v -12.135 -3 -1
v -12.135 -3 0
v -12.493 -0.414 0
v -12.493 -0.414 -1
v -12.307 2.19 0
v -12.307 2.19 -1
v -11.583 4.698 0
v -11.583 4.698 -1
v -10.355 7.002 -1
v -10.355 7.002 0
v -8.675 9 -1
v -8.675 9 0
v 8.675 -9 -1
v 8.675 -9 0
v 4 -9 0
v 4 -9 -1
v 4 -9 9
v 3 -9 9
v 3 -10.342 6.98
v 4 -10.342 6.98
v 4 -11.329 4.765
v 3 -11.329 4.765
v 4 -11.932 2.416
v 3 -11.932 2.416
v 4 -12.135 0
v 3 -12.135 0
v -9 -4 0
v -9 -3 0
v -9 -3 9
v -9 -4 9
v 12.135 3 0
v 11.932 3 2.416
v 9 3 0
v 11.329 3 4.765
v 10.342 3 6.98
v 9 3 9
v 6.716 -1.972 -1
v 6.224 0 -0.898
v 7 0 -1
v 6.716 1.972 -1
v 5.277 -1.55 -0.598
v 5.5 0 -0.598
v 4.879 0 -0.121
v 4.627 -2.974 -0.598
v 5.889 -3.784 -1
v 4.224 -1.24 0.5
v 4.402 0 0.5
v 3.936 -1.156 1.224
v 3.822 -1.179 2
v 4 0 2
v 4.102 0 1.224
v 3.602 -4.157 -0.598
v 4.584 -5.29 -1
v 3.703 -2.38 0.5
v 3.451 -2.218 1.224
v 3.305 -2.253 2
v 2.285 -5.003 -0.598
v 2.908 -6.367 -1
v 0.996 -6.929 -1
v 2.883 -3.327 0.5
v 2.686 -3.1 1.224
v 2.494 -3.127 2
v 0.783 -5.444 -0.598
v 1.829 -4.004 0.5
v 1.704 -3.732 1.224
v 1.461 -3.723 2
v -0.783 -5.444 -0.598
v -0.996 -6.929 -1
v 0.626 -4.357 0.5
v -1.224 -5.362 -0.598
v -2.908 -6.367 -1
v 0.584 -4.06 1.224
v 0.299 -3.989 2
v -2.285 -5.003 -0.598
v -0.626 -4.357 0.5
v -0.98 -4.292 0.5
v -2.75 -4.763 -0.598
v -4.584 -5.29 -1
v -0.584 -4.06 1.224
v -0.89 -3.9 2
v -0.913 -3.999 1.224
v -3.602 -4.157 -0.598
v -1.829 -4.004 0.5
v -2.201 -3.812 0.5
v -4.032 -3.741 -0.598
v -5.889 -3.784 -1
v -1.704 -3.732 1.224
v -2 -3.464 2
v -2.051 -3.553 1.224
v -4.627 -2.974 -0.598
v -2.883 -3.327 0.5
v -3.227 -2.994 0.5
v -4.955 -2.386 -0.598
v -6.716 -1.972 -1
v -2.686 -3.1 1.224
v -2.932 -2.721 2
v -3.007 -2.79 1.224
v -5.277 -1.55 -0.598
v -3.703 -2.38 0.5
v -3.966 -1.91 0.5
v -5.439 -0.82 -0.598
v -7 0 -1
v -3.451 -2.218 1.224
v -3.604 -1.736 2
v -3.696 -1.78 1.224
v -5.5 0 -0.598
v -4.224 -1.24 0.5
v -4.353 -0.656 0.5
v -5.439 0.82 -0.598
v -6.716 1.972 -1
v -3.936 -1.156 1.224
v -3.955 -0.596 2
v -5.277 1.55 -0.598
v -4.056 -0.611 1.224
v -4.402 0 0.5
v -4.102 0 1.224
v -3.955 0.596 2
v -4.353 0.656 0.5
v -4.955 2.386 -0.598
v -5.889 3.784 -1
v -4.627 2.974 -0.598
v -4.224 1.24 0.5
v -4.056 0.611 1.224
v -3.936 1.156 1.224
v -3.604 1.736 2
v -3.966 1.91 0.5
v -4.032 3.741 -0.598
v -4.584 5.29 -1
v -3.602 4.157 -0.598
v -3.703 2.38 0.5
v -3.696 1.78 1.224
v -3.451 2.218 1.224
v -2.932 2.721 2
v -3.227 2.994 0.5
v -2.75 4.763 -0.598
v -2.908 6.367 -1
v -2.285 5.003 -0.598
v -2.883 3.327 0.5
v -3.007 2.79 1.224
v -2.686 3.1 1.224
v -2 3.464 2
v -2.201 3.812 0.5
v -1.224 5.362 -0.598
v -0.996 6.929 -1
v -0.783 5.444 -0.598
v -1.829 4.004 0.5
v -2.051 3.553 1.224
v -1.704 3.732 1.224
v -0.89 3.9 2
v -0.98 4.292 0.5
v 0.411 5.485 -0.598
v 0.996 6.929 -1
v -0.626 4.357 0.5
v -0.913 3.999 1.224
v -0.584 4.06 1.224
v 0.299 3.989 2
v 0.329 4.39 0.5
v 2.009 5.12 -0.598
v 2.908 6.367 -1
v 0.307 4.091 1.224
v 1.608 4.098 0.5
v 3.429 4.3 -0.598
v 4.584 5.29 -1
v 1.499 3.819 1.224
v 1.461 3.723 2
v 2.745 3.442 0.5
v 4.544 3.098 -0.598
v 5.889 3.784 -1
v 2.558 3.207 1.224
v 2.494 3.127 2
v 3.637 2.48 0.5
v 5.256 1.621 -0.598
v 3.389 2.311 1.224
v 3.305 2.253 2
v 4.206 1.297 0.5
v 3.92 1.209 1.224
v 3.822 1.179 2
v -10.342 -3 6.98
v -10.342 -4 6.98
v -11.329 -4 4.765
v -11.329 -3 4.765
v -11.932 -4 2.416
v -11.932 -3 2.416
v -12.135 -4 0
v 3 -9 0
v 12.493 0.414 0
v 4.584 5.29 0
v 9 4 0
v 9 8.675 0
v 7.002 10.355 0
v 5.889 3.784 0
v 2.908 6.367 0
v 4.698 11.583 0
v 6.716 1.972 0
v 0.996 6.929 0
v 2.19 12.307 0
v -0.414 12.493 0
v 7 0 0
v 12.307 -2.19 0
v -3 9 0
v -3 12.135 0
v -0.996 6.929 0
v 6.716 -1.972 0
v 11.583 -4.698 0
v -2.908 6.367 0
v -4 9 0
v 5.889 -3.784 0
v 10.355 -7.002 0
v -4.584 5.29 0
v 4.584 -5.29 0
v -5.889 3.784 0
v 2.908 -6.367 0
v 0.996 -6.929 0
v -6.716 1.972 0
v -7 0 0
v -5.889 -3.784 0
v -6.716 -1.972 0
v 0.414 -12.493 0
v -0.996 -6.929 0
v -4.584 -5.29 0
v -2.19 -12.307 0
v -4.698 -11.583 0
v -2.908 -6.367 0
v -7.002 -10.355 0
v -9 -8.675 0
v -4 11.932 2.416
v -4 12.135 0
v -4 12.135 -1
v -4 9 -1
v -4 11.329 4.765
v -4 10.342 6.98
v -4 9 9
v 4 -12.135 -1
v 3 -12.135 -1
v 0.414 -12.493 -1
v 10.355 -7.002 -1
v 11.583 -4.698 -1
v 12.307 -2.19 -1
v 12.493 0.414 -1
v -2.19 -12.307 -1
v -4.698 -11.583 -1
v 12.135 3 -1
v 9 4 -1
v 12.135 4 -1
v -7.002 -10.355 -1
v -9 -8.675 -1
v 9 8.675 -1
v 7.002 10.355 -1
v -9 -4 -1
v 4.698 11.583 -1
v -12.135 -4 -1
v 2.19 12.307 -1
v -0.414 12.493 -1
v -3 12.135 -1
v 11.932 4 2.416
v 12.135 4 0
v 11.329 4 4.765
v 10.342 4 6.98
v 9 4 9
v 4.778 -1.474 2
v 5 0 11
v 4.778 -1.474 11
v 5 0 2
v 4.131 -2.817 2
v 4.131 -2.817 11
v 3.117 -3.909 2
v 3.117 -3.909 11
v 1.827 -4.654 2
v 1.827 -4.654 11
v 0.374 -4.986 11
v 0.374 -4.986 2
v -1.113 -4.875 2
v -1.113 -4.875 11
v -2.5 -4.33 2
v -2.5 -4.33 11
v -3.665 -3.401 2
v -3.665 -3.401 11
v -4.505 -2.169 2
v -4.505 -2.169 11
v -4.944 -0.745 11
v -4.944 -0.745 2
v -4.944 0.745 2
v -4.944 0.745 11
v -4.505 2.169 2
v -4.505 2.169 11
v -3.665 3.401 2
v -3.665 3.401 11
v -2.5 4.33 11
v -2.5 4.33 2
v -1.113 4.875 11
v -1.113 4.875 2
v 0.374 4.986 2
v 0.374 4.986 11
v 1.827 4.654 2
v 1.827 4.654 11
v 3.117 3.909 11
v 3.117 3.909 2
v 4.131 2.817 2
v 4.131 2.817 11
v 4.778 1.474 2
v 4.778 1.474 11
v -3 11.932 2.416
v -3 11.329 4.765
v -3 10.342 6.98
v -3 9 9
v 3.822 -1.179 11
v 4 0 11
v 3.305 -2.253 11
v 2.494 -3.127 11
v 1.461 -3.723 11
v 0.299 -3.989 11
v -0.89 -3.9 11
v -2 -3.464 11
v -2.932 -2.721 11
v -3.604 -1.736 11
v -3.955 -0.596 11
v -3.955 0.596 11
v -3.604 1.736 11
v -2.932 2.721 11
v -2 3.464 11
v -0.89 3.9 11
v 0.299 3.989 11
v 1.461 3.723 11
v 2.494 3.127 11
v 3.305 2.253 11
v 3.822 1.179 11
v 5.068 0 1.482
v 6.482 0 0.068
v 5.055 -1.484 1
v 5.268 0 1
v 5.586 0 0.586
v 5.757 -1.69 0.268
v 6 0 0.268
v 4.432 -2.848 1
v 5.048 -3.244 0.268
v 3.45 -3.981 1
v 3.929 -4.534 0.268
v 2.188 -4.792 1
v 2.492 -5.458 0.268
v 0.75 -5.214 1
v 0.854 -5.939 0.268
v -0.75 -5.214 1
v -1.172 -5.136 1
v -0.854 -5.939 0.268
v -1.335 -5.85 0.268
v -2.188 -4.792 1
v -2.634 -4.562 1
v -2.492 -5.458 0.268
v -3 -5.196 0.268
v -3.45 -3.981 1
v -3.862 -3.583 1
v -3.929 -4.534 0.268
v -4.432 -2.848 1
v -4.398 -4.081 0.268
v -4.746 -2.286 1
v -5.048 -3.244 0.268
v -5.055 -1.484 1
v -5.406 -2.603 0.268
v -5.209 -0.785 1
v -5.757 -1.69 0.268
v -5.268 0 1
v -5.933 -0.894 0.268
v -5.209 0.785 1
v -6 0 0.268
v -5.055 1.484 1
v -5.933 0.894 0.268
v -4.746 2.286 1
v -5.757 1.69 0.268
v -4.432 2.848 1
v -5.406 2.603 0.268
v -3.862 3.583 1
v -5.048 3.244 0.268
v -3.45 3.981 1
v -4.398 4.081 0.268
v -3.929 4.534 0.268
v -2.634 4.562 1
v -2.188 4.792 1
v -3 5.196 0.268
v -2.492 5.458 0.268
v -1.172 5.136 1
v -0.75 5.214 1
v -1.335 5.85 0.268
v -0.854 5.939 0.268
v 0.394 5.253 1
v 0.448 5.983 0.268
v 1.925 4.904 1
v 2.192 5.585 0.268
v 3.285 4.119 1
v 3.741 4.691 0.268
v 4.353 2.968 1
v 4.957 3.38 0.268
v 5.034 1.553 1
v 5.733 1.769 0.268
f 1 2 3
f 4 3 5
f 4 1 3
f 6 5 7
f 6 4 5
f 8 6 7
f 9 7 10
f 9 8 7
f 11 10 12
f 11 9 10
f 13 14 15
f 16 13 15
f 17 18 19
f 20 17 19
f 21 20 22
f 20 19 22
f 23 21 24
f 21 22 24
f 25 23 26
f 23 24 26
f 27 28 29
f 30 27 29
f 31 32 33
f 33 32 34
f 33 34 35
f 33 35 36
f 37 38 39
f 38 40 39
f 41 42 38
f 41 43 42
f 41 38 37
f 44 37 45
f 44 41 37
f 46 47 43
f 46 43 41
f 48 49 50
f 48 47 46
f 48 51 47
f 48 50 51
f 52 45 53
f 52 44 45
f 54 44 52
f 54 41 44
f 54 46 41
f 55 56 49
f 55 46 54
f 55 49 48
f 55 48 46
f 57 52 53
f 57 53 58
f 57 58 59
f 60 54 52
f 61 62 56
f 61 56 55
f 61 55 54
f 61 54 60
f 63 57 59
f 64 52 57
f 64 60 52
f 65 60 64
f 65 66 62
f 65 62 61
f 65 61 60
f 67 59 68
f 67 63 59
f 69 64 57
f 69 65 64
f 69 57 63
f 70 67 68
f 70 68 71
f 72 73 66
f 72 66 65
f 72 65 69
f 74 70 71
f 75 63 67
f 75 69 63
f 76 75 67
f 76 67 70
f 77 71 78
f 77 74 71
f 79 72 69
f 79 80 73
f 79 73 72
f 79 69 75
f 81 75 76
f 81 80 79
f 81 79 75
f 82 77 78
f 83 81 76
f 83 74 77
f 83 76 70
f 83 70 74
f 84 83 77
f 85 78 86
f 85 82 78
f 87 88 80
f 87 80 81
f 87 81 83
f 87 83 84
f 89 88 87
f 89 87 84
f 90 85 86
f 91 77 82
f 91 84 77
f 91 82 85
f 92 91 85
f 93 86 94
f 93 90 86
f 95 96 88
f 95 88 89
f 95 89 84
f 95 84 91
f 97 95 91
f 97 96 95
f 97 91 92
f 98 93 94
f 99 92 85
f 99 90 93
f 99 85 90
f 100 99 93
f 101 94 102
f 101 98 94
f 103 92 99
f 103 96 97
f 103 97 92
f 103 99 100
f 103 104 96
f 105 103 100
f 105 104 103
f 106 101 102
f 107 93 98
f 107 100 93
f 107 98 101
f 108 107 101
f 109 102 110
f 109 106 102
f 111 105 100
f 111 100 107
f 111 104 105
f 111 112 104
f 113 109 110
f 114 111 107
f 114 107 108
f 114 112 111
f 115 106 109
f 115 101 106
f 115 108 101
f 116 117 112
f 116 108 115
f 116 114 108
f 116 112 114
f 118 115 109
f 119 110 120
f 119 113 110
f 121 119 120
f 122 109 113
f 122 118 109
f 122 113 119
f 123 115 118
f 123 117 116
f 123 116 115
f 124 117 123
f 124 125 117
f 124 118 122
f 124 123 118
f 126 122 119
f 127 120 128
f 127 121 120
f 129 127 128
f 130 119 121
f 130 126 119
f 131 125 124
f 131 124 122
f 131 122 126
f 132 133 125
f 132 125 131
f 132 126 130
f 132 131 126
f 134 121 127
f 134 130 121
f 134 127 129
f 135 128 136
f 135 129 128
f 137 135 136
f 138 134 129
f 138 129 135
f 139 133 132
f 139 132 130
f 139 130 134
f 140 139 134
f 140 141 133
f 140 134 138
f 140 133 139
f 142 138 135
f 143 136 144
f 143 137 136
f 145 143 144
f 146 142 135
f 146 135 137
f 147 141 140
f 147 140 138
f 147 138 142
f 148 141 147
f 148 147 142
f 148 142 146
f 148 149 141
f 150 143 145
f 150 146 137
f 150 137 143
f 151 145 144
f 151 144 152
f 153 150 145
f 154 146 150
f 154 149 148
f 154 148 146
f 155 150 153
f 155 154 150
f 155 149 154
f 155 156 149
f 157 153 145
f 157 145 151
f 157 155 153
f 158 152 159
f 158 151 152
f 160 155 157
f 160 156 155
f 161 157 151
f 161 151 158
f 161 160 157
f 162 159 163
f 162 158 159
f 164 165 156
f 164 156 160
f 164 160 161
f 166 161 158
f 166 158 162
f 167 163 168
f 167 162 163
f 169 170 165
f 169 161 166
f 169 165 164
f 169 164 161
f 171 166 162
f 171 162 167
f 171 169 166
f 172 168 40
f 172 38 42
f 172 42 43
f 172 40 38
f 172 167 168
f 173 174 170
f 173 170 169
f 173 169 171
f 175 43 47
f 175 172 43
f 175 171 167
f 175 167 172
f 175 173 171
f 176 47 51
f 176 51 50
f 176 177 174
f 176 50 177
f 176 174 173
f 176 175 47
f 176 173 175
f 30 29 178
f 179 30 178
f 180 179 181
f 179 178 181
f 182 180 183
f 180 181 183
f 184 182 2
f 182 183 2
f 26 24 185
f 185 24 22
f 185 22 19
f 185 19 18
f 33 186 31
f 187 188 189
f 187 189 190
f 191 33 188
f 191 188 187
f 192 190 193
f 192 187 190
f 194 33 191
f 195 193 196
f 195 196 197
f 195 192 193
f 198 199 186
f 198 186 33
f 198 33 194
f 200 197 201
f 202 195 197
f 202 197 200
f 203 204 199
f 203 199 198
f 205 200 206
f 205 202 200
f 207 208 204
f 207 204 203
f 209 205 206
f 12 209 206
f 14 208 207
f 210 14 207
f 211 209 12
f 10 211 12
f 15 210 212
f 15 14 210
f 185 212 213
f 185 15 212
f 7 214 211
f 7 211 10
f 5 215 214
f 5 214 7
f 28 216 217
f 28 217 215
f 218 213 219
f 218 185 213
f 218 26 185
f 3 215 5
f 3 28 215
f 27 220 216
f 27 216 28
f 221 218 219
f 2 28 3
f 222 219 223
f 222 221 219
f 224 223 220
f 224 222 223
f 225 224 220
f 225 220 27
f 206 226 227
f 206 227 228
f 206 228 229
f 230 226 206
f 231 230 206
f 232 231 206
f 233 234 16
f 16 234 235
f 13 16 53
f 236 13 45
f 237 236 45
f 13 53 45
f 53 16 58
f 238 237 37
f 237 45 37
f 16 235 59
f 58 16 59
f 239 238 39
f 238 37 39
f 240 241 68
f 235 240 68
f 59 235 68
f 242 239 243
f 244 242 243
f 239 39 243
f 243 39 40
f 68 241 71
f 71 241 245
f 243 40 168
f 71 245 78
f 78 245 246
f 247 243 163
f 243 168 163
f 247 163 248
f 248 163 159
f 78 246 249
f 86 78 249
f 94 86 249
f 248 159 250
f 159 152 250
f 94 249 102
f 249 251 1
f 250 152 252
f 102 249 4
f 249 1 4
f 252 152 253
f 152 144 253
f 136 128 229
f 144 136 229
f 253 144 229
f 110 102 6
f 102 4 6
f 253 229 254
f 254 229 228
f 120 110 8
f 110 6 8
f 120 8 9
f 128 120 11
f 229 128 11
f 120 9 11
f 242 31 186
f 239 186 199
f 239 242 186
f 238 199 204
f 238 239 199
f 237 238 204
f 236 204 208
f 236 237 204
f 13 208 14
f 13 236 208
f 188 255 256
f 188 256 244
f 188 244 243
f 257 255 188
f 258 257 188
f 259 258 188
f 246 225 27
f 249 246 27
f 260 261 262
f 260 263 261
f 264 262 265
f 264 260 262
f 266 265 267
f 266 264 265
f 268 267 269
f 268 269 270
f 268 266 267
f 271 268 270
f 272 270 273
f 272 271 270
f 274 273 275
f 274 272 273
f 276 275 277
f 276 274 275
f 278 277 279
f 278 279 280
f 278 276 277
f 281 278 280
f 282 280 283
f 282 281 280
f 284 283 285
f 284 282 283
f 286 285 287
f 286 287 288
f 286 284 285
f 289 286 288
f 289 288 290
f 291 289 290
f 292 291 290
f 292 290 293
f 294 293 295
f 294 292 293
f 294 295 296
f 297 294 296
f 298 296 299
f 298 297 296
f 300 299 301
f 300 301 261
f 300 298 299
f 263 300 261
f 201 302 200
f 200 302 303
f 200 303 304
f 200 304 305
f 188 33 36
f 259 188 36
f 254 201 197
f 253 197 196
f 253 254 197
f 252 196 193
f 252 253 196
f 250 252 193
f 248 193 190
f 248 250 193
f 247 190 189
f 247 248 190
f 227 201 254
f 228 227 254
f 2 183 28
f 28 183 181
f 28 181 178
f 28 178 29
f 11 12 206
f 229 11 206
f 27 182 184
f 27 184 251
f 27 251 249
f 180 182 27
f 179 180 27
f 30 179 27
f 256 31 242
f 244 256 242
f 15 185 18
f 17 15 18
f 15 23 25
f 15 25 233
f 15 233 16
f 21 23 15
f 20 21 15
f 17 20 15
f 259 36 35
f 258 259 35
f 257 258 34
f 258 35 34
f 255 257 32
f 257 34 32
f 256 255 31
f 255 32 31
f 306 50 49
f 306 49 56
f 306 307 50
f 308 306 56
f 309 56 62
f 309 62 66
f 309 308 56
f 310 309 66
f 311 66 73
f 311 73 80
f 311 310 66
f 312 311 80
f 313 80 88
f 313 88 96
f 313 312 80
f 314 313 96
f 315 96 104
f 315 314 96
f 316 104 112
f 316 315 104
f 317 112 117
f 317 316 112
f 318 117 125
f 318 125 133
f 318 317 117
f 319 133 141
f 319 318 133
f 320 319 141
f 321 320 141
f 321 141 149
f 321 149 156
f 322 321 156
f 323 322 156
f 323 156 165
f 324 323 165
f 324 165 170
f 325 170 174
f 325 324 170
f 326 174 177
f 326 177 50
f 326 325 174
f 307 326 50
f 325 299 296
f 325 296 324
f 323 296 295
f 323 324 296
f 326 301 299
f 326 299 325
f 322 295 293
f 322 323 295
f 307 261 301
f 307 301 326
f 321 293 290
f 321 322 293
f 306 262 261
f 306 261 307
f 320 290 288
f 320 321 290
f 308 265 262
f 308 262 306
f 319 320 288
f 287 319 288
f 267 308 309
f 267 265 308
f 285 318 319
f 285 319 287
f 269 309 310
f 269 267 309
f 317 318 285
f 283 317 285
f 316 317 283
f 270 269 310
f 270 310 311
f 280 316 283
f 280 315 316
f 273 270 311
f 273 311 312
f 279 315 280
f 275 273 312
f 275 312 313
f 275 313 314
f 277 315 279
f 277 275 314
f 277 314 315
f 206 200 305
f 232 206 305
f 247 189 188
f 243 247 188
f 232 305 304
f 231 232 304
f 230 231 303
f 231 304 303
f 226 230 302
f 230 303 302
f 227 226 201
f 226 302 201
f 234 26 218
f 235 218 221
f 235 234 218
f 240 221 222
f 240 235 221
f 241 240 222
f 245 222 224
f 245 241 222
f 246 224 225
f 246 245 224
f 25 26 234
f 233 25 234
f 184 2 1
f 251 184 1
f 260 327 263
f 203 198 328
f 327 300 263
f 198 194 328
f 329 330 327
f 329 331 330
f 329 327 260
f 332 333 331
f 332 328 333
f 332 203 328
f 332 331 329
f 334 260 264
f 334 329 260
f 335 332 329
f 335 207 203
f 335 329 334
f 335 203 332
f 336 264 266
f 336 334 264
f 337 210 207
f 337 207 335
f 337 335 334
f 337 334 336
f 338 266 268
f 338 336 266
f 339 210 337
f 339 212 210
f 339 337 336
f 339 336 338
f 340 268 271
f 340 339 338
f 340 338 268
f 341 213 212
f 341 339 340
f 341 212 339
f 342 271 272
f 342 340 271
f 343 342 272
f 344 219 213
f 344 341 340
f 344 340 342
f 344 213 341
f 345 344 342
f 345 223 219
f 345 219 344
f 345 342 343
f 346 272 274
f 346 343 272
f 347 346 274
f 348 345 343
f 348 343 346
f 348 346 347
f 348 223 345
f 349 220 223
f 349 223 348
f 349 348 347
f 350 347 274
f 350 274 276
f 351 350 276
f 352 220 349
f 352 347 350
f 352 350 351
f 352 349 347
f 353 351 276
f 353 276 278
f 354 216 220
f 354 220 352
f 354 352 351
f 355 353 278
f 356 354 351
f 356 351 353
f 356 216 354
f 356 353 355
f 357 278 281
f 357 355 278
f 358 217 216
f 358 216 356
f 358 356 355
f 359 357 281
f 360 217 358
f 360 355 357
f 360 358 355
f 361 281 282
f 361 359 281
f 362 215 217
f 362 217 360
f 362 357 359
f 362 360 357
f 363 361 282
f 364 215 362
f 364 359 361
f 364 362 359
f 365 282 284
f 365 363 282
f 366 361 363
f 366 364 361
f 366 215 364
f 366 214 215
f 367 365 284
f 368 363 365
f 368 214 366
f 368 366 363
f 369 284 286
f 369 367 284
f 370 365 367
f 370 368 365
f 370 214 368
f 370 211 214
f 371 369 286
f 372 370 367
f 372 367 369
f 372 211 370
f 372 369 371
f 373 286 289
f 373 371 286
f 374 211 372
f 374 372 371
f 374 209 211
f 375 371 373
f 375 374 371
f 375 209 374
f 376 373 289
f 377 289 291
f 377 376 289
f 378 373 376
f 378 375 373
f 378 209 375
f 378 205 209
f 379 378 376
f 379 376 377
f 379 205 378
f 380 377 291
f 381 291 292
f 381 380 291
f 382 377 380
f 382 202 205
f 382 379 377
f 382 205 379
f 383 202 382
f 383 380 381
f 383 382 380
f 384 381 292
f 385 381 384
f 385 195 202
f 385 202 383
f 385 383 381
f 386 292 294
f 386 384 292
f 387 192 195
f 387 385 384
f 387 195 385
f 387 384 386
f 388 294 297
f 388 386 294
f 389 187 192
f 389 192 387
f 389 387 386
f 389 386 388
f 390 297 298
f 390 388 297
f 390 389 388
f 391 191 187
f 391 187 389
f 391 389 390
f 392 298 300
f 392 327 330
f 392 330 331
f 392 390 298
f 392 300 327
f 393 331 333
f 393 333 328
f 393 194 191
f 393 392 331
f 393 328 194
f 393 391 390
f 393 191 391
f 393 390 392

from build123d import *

# Parameters (mm, degrees)
CUT_EXTRUDE1_REACH  = 22.821
SKETCH2_W           = 5.674675786
SKETCH2_H           = 3.1346611
BOSS_EXTRUDE1_DEPTH = 1
CIRPATTERN1_COUNT   = 4


with BuildPart() as part:
    # Sketch1 → Revolve-Thin2 (revolve)
    with BuildSketch(Plane.YZ, mode=Mode.PRIVATE) as revolve_thin2_sk:
        with BuildLine():
            Line((5, 11), (5, 2))
            ThreePointArc((5, 2), (5.585786438, 0.585786438), (7, 0))
            Line((7, 0), (12.5, 0))
            Line((12.5, 0), (12.5, -1))
            Line((12.5, -1), (7, -1))
            ThreePointArc((7, -1), (4.878679656, -0.121320344), (4, 2))
            Line((4, 2), (4, 11))
            Line((4, 11), (5, 11))
        make_face()
    revolve(revolve_thin2_sk.sketch.rotate(Axis((0, 0, 14.992157351), (0, 0, -1)), 90), axis=Axis((0, 0, 14.992157351), (0, 0, -1)))

    # Sketch2 → Cut-Extrude1 (cut, up to next)
    with BuildSketch(Plane(origin=(0, 0, 0), x_dir=(0, 1, 0), z_dir=(0, 0, 1)), mode=Mode.PRIVATE) as cut_extrude1_sk1:
        with Locations((-5.837337893, 10.56733055)):
            Rectangle(SKETCH2_W, SKETCH2_H)
    cut_extrude1_tool1 = extrude(cut_extrude1_sk1.sketch, amount=-CUT_EXTRUDE1_REACH, mode=Mode.PRIVATE) & part.part
    cut_extrude1 = cut_extrude1_tool1.solids().sort_by_distance((-10.567331, -5.837338, 0))[0]
    add(cut_extrude1, mode=Mode.SUBTRACT)

    # Sketch3 → Boss-Extrude1 (add)
    with BuildSketch(Plane.XZ.offset(3)):
        with BuildLine():
            Line((-9, -1), (-9, 9))
            ThreePointArc((-9, 9), (-11.328570013, 4.765136415), (-12.1346611, 0))
            Line((-12.1346611, 0), (-12.1346611, -1))
            Line((-12.1346611, -1), (-9, -1))
        make_face()
    boss_extrude1 = extrude(amount=BOSS_EXTRUDE1_DEPTH)

    # CirPattern1: Cut-Extrude1, Boss-Extrude1 ×4 about axis
    cirpattern1_axis = Axis((0, 0, 0), (0, 0, 1))
    add([cut_extrude1.rotate(cirpattern1_axis, i * 360 / CIRPATTERN1_COUNT) for i in range(1, CIRPATTERN1_COUNT)], mode=Mode.SUBTRACT)
    add([boss_extrude1.rotate(cirpattern1_axis, i * 360 / CIRPATTERN1_COUNT) for i in range(1, CIRPATTERN1_COUNT)])


solid = part.part
